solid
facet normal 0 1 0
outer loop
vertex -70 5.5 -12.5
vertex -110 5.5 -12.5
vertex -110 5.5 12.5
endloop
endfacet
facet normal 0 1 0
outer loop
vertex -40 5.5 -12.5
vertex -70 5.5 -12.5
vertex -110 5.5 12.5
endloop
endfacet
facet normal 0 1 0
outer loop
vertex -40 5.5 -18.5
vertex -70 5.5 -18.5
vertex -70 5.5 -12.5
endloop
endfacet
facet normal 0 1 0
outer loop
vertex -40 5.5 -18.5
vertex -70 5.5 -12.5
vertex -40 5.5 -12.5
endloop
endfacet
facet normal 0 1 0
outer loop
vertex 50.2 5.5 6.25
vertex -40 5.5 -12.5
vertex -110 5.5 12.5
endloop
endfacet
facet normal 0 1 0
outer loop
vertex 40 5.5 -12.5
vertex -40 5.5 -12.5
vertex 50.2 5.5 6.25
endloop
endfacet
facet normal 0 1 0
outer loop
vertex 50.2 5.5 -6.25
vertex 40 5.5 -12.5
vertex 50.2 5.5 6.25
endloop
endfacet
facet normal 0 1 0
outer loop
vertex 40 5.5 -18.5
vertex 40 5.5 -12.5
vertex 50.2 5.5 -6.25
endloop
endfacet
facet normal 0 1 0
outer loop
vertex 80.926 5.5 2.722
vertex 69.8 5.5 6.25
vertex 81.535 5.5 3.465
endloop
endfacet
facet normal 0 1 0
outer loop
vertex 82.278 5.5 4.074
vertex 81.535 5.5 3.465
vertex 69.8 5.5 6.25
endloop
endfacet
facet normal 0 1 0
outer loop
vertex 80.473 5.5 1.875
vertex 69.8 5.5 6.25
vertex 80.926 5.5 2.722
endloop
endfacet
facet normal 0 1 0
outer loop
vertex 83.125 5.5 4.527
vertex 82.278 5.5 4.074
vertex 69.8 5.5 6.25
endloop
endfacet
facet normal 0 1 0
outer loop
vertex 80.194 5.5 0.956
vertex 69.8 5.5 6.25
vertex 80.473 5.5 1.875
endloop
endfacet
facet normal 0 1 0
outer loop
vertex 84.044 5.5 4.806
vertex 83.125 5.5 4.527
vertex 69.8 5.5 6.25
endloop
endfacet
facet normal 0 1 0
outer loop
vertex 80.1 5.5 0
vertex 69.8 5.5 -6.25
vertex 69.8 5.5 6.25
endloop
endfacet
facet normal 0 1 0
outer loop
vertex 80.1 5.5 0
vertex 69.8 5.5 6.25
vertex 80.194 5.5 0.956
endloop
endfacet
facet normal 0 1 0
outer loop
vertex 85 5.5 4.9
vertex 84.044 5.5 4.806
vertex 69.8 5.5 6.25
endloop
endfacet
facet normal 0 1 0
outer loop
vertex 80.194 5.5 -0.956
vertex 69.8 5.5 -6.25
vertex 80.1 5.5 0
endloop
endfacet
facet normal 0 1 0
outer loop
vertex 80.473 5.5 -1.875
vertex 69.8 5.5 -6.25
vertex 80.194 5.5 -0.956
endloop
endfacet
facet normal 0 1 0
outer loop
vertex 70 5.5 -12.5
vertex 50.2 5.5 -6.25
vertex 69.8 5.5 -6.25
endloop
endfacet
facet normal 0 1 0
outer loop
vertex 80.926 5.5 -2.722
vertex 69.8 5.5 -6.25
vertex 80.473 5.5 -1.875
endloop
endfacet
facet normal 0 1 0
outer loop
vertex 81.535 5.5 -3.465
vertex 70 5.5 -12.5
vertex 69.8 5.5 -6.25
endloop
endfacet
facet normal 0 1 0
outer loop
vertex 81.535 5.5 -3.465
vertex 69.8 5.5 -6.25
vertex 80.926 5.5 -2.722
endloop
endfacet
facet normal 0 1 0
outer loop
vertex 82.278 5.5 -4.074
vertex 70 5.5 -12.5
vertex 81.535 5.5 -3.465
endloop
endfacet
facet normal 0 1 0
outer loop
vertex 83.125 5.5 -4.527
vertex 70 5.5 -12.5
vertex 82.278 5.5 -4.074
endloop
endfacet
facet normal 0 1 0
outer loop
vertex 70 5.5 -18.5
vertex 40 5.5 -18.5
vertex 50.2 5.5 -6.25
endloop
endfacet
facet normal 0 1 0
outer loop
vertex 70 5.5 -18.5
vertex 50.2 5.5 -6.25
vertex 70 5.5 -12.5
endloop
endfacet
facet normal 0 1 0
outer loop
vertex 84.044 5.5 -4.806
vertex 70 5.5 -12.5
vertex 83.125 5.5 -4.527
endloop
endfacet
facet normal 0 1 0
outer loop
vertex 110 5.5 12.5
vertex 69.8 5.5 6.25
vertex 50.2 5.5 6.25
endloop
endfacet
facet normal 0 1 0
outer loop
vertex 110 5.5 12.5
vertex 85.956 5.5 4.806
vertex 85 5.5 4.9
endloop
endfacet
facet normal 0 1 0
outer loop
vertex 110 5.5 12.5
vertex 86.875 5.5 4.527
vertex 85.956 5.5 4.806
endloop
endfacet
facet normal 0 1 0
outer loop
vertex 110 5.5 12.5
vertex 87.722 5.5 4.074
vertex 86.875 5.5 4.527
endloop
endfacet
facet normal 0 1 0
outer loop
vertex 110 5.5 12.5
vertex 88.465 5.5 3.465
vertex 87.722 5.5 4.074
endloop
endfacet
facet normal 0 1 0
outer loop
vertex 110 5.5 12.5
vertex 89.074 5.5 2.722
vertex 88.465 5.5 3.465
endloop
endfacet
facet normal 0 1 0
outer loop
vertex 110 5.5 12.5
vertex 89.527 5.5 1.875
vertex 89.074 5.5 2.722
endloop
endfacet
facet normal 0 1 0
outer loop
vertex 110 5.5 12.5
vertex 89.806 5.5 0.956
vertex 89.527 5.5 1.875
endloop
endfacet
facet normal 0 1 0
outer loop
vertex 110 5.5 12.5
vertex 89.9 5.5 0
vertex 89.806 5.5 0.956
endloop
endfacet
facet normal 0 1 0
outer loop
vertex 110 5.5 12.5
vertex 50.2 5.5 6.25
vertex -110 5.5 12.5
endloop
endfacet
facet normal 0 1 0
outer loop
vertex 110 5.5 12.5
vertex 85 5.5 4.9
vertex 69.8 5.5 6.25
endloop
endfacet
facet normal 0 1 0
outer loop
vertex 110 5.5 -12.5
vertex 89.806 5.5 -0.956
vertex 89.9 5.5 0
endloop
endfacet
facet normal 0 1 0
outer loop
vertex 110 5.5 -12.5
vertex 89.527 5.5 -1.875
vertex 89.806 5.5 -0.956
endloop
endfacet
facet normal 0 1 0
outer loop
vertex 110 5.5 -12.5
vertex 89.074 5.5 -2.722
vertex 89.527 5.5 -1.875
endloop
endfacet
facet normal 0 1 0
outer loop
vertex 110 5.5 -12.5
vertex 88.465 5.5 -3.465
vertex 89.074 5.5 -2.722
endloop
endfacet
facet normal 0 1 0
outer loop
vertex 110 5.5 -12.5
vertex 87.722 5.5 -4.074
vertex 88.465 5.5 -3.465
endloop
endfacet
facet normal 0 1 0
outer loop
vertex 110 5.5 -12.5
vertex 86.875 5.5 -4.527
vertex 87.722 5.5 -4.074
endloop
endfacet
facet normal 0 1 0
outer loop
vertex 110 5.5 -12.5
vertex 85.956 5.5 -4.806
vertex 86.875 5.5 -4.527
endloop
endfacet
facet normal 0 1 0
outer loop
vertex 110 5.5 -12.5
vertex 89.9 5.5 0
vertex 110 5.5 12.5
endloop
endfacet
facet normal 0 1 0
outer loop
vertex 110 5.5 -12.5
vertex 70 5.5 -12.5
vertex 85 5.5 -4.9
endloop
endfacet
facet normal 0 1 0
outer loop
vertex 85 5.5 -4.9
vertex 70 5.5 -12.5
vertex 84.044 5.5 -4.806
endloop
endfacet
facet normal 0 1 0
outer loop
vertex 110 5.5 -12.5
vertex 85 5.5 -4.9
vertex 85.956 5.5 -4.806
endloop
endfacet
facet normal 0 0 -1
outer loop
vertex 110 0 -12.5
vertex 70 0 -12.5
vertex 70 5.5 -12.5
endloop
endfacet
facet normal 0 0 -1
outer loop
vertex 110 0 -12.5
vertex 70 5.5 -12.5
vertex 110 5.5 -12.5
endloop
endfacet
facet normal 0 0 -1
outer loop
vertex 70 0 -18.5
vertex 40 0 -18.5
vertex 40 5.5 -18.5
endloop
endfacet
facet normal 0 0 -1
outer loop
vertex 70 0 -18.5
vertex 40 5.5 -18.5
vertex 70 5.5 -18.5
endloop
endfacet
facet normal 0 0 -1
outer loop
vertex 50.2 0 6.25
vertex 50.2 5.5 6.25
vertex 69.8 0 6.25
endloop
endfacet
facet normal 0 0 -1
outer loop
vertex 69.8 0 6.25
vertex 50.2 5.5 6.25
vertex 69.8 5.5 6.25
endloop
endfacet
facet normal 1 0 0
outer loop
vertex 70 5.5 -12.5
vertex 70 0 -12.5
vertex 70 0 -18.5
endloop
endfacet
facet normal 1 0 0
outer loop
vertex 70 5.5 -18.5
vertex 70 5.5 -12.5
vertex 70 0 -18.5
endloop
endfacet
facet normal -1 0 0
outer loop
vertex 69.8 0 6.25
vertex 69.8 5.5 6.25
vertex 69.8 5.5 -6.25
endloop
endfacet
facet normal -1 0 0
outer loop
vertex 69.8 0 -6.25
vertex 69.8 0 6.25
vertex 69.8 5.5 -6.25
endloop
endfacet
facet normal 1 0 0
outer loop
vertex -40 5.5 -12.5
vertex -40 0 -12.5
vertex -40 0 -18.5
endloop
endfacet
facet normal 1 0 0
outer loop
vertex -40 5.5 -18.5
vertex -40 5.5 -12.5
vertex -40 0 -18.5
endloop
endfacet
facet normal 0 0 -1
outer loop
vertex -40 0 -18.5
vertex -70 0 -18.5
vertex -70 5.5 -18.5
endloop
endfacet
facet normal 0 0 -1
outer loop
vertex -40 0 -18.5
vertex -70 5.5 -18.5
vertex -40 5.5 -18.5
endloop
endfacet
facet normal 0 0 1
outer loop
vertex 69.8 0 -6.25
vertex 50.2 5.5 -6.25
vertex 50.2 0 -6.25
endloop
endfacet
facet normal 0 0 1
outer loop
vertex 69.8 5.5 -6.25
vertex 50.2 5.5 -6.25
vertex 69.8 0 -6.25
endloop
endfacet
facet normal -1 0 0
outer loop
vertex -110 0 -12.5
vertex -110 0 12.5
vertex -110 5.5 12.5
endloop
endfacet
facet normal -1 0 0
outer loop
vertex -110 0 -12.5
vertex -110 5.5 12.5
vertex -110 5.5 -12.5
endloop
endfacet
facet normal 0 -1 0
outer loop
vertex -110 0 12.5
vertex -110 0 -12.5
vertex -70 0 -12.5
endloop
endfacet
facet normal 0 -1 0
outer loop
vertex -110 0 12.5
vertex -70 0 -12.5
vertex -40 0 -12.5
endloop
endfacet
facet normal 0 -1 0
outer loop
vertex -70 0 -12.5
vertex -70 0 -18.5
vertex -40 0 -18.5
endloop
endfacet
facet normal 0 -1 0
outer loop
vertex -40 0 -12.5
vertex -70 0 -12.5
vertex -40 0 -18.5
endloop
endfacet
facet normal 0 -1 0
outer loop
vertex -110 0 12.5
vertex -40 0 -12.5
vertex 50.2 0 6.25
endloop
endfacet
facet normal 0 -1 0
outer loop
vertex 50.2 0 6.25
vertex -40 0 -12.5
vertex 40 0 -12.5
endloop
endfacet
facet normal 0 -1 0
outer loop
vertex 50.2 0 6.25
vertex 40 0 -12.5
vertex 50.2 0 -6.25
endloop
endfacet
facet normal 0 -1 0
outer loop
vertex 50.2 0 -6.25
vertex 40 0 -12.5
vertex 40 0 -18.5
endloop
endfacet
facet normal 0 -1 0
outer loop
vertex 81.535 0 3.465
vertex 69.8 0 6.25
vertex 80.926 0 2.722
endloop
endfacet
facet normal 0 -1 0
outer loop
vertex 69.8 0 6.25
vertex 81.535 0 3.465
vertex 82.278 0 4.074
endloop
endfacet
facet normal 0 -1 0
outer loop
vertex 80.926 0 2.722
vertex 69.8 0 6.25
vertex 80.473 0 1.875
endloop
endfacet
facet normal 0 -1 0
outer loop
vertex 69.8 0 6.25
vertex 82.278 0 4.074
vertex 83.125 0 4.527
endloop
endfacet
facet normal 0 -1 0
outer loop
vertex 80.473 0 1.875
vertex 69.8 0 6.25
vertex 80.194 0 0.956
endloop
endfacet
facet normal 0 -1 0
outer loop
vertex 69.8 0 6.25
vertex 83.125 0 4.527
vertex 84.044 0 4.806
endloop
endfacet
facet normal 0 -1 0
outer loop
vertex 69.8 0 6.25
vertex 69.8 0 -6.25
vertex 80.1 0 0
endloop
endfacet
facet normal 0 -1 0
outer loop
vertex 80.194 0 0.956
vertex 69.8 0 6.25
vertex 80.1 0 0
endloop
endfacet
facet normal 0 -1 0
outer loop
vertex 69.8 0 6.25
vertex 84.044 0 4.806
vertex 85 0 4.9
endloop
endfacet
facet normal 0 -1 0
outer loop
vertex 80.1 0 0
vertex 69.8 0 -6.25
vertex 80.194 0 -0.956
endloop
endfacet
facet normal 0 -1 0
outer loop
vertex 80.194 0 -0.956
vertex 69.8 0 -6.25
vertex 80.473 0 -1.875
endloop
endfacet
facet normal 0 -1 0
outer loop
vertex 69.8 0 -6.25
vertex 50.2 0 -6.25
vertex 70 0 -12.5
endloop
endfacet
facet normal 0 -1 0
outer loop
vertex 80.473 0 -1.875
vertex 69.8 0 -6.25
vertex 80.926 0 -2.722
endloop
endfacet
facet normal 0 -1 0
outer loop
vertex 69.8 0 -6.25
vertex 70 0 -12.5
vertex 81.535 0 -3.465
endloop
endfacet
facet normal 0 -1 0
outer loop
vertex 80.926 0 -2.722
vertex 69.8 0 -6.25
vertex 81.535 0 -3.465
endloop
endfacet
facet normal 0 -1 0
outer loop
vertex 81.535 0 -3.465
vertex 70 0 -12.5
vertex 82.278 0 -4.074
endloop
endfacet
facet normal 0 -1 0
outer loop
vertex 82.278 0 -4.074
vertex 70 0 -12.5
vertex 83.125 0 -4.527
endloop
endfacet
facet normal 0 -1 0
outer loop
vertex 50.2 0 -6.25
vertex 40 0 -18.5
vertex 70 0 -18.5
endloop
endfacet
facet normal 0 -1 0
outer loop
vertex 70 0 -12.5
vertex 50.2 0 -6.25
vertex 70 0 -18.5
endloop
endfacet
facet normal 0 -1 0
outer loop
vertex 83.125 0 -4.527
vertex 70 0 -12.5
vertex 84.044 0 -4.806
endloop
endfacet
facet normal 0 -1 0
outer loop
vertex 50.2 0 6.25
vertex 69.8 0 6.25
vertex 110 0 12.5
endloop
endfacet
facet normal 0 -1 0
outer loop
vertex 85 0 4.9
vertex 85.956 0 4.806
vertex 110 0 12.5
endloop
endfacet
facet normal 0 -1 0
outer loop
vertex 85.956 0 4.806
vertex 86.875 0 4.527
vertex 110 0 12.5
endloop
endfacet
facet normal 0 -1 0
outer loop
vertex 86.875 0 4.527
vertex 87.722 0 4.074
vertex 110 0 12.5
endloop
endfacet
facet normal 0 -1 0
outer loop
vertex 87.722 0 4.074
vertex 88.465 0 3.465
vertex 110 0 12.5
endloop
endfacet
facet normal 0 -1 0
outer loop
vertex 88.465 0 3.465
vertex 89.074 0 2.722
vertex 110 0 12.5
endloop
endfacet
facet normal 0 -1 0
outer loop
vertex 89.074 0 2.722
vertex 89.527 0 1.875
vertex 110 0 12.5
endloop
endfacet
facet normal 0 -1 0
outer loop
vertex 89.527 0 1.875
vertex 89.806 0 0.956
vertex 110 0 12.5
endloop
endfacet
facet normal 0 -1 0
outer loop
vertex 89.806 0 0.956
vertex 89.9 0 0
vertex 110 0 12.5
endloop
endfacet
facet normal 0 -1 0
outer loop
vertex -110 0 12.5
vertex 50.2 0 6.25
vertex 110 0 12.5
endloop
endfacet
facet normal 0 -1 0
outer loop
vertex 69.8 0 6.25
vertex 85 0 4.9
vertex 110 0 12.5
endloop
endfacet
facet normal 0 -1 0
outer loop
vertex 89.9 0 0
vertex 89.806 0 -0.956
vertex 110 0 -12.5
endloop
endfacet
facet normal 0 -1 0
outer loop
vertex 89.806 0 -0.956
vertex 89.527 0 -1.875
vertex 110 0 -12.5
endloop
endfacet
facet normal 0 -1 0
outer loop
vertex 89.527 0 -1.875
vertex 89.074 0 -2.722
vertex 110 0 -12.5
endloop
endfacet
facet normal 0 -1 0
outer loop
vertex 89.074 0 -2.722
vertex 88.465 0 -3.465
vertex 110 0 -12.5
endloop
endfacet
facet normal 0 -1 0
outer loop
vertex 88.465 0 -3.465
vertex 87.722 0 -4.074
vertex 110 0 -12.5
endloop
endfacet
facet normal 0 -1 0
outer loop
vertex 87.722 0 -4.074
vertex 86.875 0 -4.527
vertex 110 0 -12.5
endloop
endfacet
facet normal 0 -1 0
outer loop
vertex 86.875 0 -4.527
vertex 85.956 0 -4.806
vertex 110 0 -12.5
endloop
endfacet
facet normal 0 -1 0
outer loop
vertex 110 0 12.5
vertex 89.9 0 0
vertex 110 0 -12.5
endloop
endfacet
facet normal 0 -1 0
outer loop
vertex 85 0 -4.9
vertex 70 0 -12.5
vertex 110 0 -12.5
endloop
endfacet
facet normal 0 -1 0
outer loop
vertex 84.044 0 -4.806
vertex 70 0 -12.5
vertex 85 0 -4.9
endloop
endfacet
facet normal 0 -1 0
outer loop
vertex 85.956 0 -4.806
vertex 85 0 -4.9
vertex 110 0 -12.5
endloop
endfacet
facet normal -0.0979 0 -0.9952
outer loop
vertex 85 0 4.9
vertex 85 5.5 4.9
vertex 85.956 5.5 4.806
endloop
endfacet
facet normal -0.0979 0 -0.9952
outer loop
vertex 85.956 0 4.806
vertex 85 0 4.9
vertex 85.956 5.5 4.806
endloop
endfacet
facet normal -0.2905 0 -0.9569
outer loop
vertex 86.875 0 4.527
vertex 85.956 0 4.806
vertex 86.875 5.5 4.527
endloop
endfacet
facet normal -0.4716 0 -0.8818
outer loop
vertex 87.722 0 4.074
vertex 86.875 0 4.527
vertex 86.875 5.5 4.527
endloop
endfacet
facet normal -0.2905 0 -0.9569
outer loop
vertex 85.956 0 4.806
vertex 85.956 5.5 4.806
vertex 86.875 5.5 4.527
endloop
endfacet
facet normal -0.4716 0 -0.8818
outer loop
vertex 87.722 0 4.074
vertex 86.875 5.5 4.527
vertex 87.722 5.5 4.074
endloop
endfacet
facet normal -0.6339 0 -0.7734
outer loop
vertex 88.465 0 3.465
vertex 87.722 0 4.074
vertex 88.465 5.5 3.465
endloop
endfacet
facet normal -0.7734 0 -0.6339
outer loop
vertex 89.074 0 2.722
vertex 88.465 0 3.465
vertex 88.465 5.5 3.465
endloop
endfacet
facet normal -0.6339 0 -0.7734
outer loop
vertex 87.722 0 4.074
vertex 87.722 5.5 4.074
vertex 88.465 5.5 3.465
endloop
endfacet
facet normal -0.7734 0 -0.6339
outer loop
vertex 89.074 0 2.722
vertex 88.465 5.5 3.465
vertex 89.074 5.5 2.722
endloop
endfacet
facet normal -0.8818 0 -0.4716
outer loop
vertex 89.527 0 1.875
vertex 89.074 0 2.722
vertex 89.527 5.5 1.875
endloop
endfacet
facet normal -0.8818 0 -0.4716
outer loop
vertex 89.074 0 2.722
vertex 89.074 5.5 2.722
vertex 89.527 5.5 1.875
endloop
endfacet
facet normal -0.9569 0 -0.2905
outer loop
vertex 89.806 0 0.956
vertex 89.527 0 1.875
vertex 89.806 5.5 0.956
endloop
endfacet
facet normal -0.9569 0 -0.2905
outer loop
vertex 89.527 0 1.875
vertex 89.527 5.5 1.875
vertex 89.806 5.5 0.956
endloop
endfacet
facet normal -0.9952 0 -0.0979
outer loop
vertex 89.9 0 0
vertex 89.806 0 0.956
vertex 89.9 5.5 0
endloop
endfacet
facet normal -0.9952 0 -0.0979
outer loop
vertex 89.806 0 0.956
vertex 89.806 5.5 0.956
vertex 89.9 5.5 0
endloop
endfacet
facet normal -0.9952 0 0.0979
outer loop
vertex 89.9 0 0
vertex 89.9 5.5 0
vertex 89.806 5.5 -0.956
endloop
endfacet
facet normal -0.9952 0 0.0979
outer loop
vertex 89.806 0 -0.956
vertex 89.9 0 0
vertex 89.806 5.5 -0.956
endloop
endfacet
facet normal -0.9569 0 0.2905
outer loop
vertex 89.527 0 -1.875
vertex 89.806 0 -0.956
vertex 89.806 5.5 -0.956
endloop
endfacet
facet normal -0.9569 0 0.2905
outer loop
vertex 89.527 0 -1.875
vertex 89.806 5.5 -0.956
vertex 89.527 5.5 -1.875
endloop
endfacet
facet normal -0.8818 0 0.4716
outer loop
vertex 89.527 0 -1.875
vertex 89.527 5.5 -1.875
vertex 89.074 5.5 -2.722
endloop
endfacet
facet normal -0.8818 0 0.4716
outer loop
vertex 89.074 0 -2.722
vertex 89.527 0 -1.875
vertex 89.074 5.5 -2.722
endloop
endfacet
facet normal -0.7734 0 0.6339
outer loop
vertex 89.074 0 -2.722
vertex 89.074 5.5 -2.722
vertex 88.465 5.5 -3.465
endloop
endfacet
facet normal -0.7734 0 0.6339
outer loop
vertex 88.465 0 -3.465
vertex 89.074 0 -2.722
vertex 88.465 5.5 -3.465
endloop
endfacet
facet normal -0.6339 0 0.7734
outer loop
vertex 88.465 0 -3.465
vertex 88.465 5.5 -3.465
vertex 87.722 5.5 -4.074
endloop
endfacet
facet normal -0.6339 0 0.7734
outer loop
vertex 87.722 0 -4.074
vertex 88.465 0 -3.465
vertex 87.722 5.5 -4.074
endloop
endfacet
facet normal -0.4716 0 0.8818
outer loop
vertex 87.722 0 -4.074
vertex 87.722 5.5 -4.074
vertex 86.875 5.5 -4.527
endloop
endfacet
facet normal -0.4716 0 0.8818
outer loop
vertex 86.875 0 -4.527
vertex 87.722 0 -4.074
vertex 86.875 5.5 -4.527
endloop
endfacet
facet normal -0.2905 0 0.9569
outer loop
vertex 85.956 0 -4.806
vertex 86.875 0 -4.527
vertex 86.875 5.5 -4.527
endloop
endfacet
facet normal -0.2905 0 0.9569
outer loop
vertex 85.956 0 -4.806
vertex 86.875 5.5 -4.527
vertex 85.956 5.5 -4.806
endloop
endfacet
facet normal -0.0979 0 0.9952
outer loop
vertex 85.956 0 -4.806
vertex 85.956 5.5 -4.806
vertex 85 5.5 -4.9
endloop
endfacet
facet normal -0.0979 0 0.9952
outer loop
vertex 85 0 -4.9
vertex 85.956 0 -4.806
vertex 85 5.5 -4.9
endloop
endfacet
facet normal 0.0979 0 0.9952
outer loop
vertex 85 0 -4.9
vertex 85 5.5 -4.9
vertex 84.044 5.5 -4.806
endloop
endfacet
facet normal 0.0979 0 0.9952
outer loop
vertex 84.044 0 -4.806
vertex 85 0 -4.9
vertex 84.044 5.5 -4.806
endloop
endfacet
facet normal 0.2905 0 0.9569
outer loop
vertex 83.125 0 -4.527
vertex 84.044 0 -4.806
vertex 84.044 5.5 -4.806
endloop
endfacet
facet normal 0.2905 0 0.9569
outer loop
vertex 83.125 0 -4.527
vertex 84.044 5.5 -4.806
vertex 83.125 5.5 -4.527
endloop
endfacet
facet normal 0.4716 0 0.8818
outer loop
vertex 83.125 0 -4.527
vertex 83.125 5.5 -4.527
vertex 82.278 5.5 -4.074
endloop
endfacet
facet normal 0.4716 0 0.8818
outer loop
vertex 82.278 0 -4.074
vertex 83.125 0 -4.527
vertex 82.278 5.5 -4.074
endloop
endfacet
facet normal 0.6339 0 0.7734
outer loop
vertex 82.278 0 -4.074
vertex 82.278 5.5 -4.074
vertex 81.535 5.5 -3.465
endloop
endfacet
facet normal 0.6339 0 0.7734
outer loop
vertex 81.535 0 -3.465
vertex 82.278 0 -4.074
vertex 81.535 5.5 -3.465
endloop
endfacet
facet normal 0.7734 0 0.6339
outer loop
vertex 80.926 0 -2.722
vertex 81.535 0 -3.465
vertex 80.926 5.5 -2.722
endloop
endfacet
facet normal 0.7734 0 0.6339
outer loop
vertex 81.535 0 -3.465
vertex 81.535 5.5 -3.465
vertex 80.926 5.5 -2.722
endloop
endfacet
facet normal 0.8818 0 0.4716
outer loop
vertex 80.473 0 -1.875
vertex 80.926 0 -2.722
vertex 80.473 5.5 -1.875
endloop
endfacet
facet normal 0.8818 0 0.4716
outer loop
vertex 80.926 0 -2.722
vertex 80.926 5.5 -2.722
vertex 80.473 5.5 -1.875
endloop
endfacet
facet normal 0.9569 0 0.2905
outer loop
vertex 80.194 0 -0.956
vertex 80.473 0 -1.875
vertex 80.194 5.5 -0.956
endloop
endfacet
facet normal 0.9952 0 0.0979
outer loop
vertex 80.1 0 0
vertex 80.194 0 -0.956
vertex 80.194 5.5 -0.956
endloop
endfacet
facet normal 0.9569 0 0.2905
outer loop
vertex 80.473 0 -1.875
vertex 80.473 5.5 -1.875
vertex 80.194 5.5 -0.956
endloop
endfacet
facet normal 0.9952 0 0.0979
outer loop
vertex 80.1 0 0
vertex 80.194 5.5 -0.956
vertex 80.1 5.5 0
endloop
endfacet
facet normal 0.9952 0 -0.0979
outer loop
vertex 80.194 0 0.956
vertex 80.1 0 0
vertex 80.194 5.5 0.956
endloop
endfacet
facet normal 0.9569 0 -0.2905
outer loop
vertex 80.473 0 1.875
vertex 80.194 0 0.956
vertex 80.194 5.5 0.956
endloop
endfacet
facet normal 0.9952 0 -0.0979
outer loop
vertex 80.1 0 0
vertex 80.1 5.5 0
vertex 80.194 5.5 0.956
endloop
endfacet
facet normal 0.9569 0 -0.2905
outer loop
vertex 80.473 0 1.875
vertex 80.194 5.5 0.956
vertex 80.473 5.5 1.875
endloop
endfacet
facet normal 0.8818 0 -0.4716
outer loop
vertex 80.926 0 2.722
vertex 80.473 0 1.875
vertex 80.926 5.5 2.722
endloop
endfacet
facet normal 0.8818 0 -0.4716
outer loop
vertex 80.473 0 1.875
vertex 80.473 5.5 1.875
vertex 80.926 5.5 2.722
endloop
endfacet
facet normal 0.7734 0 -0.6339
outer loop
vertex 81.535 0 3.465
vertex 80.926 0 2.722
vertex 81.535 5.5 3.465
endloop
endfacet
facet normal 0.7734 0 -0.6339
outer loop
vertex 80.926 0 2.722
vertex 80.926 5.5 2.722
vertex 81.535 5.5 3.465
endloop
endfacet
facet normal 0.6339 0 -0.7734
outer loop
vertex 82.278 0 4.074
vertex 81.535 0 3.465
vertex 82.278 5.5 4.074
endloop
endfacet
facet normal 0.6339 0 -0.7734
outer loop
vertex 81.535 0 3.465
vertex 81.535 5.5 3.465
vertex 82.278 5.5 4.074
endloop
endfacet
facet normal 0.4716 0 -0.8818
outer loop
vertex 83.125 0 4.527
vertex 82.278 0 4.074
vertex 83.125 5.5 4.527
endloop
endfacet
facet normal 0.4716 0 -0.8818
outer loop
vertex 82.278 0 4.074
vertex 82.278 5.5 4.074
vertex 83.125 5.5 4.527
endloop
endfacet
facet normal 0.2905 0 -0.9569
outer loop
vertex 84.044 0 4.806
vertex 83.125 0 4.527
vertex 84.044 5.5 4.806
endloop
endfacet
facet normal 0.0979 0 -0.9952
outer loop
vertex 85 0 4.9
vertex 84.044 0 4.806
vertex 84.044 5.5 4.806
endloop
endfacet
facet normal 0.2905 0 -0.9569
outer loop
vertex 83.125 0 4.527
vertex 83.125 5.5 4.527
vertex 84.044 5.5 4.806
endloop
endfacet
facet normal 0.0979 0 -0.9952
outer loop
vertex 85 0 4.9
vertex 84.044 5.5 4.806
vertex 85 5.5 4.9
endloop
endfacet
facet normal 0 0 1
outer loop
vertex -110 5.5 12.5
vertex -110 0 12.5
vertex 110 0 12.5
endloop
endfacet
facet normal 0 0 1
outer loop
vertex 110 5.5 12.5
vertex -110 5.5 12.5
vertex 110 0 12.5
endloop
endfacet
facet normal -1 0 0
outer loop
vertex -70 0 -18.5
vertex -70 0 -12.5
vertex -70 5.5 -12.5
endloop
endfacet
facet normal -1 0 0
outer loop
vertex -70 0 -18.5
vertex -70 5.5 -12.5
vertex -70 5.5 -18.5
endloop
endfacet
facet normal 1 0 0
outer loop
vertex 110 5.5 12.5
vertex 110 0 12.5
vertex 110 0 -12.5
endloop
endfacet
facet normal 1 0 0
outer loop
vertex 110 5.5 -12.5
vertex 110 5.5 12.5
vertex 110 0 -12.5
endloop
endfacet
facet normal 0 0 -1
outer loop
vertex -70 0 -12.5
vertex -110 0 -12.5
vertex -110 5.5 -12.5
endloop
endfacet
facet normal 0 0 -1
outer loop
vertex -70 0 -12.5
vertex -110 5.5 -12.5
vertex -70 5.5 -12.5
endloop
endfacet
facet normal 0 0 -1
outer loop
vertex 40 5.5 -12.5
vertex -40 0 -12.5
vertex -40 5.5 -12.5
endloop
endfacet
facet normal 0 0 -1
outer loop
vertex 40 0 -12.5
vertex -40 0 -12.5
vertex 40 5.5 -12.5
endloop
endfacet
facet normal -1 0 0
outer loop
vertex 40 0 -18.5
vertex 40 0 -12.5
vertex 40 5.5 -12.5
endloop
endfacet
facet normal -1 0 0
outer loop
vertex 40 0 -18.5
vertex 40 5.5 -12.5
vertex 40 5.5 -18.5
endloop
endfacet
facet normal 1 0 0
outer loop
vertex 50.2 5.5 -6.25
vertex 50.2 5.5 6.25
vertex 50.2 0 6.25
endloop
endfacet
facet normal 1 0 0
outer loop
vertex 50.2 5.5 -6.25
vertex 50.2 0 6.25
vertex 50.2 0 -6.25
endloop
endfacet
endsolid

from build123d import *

# Parameters (mm, degrees)
SKETCH1_W           = 30
SKETCH1_H           = 6
SKETCH1_W_2         = 220
SKETCH1_H_2         = 25
BOSS_EXTRUDE1_DEPTH = 5.5
SKETCH2_R           = 4.9
SKETCH2_W           = 19.6
SKETCH2_H           = 12.5
CUT_EXTRUDE1_DEPTH  = 112.680347421


with BuildPart() as part:
    # Sketch1 → Boss-Extrude1 (new body)
    with BuildSketch(Plane(origin=(0, 0, 0), x_dir=(1, 0, 0), z_dir=(0, 1, 0))):
        with Locations((-55, 15.5)):
            Rectangle(SKETCH1_W, SKETCH1_H)
        Rectangle(SKETCH1_W_2, SKETCH1_H_2)
        with Locations((55, 15.5)):
            Rectangle(SKETCH1_W, SKETCH1_H)
    extrude(amount=BOSS_EXTRUDE1_DEPTH)

    # Sketch2 → Cut-Extrude1 (cut, through all)
    with BuildSketch(Plane(origin=(0, 5.5, 0), x_dir=(1, 0, 0), z_dir=(0, 1, 0))):
        with Locations(Location((85, 0, 0), (0, 0, 270))):
            Circle(SKETCH2_R)
        with Locations((60, 0)):
            Rectangle(SKETCH2_W, SKETCH2_H)
    extrude(amount=-CUT_EXTRUDE1_DEPTH, mode=Mode.SUBTRACT)


solid = part.part
